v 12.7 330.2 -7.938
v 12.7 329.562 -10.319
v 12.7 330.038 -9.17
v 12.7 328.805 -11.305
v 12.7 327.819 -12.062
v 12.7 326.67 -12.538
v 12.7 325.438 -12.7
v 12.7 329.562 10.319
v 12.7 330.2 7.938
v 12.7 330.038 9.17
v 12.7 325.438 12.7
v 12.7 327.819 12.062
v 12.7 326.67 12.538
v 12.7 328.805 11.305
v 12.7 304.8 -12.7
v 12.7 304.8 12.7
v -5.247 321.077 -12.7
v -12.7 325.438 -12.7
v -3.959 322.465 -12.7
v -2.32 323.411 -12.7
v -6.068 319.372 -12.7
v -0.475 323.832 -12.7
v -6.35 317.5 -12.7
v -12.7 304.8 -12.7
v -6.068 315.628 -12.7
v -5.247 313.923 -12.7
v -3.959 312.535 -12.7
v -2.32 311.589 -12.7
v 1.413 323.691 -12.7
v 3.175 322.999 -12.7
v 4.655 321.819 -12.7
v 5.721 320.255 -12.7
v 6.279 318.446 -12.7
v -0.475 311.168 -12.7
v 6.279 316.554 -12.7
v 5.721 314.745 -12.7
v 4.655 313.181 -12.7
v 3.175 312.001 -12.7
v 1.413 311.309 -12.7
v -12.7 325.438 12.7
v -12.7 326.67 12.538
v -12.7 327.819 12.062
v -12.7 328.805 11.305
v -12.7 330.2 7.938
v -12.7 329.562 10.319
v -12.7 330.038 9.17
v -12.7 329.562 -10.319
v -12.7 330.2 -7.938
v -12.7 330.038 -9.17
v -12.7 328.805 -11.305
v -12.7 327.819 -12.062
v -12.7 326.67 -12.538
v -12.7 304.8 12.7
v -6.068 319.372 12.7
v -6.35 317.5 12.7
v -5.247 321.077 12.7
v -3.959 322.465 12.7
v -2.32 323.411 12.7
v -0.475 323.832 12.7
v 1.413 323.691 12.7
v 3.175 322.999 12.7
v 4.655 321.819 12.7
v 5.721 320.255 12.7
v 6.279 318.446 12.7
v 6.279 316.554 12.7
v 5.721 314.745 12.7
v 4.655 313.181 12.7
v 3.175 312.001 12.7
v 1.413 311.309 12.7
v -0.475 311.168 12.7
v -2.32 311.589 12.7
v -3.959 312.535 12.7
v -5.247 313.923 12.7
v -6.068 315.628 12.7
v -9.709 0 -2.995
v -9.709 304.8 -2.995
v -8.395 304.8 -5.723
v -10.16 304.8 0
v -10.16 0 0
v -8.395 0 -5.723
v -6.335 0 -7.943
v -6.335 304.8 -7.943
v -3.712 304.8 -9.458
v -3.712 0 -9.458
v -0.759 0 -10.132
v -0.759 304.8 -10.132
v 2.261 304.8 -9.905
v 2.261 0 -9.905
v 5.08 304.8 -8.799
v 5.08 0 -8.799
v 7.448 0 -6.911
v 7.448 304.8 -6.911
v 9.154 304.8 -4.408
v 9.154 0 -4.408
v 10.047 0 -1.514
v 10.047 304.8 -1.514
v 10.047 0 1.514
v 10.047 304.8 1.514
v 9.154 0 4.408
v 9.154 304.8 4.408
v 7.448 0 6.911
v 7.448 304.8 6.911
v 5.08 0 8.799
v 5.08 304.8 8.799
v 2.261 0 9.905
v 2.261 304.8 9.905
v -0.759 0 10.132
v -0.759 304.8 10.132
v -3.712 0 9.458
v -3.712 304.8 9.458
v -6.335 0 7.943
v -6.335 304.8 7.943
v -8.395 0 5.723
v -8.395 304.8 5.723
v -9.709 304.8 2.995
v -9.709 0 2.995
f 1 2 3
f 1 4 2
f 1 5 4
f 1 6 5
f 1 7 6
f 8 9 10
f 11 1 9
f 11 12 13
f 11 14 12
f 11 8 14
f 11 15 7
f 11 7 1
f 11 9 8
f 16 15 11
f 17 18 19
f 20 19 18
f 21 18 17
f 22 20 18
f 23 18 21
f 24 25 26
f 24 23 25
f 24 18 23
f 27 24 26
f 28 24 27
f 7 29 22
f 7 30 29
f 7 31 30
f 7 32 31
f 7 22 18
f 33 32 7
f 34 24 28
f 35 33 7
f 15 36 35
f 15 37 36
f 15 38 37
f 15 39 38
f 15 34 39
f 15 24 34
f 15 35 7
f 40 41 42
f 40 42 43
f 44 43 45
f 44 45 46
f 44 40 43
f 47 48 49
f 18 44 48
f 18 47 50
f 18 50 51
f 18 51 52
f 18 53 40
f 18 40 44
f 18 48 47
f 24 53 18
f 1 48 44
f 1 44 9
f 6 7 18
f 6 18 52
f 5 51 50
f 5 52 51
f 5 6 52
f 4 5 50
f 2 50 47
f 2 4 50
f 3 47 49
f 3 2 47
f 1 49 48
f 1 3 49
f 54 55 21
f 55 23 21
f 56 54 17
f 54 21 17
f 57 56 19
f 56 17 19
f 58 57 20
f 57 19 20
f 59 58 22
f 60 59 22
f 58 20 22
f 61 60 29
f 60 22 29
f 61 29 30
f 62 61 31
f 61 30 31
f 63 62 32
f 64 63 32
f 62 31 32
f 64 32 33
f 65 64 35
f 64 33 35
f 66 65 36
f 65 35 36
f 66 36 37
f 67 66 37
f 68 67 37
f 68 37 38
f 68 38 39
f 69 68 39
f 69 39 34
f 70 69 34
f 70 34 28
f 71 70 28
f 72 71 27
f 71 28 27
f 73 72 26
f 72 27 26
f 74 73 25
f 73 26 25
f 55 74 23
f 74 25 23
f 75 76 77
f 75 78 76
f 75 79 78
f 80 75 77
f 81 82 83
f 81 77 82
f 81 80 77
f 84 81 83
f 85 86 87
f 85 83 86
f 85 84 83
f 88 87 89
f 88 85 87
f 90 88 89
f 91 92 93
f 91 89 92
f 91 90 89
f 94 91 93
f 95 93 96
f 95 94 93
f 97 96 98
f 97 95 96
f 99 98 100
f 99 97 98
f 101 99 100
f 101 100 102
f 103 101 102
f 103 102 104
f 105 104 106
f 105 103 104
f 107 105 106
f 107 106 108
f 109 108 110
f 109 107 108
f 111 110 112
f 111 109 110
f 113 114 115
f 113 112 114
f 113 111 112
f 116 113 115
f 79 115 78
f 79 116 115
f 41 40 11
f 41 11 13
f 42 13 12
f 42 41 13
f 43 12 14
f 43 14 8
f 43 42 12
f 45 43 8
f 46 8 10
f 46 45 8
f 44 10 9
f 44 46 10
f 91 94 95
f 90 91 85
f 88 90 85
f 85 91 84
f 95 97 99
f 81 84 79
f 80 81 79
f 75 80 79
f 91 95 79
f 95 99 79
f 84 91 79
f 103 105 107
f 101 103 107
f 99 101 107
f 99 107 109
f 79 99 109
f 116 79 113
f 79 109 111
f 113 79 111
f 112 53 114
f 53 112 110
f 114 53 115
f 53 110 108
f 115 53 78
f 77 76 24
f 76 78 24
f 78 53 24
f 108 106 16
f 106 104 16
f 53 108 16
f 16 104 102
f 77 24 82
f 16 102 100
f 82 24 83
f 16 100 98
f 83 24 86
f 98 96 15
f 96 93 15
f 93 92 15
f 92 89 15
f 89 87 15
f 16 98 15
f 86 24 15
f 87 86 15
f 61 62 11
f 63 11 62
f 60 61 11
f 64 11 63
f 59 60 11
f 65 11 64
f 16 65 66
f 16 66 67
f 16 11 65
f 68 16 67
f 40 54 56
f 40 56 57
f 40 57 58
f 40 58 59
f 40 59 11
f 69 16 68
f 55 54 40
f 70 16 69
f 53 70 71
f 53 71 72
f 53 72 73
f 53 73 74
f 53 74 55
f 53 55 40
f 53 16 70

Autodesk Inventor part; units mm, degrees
ref_plane "YZ Plane" through (0, 0, 0) normal (1, 0, 0) x (0, 1, 0)
ref_plane "XZ Plane" through (0, 0, 0) normal (0, 1, 0) x (-1, 0, 0)
ref_plane "XY Plane" through (0, 0, 0) normal (0, 0, 1) x (1, 0, 0)
sketch "Sketch1" plane through (0, 0, 0) normal (0, 1, 0) x (-1, 0, 0)
  circle A0 centre (0, 0) radius 10.16
  dimension "d0" = 20.32
extrude "Extrusion1" add sketch "Sketch1" along normal blind 304.8
sketch "Sketch2" plane through (0, 304.8, 0) normal (0, 1, 0) x (1, 0, 0)
  line L0 (12.7, -12.7) -> (-12.7, -12.7)
  line L1 (-12.7, -12.7) -> (-12.7, 12.7)
  line L2 (-12.7, 12.7) -> (12.7, 12.7)
  line L3 (12.7, 12.7) -> (12.7, -12.7)
  point P0 (0, 0)
  point P1 (0, 0)
  dimension "d3" = 25.4
  dimension "d4" = 25.4
extrude "Extrusion2" add sketch "Sketch2" along normal blind 25.4
sketch "Sketch3" plane through (12.7, 304.8, -12.7) normal (0, 0, -1) x (-1, 0, 0)
  line L0 (25.4, 0) -> (25.4, 25.4) projected
  line L1 (0, 0) -> (0, 25.4) projected
  circle A0 centre (12.7, 12.7) radius 6.35
  point P0 (12.7, -304.8)
  dimension "d7" = 12.7
extrude "Extrusion3" cut sketch "Sketch3" against normal blind 33.3375
fillet "Fillet1" radius 4.7625 2 edges at (0, 330.2, -12.7) (0, 330.2, 12.7)
properties part number "CylinderRod"
